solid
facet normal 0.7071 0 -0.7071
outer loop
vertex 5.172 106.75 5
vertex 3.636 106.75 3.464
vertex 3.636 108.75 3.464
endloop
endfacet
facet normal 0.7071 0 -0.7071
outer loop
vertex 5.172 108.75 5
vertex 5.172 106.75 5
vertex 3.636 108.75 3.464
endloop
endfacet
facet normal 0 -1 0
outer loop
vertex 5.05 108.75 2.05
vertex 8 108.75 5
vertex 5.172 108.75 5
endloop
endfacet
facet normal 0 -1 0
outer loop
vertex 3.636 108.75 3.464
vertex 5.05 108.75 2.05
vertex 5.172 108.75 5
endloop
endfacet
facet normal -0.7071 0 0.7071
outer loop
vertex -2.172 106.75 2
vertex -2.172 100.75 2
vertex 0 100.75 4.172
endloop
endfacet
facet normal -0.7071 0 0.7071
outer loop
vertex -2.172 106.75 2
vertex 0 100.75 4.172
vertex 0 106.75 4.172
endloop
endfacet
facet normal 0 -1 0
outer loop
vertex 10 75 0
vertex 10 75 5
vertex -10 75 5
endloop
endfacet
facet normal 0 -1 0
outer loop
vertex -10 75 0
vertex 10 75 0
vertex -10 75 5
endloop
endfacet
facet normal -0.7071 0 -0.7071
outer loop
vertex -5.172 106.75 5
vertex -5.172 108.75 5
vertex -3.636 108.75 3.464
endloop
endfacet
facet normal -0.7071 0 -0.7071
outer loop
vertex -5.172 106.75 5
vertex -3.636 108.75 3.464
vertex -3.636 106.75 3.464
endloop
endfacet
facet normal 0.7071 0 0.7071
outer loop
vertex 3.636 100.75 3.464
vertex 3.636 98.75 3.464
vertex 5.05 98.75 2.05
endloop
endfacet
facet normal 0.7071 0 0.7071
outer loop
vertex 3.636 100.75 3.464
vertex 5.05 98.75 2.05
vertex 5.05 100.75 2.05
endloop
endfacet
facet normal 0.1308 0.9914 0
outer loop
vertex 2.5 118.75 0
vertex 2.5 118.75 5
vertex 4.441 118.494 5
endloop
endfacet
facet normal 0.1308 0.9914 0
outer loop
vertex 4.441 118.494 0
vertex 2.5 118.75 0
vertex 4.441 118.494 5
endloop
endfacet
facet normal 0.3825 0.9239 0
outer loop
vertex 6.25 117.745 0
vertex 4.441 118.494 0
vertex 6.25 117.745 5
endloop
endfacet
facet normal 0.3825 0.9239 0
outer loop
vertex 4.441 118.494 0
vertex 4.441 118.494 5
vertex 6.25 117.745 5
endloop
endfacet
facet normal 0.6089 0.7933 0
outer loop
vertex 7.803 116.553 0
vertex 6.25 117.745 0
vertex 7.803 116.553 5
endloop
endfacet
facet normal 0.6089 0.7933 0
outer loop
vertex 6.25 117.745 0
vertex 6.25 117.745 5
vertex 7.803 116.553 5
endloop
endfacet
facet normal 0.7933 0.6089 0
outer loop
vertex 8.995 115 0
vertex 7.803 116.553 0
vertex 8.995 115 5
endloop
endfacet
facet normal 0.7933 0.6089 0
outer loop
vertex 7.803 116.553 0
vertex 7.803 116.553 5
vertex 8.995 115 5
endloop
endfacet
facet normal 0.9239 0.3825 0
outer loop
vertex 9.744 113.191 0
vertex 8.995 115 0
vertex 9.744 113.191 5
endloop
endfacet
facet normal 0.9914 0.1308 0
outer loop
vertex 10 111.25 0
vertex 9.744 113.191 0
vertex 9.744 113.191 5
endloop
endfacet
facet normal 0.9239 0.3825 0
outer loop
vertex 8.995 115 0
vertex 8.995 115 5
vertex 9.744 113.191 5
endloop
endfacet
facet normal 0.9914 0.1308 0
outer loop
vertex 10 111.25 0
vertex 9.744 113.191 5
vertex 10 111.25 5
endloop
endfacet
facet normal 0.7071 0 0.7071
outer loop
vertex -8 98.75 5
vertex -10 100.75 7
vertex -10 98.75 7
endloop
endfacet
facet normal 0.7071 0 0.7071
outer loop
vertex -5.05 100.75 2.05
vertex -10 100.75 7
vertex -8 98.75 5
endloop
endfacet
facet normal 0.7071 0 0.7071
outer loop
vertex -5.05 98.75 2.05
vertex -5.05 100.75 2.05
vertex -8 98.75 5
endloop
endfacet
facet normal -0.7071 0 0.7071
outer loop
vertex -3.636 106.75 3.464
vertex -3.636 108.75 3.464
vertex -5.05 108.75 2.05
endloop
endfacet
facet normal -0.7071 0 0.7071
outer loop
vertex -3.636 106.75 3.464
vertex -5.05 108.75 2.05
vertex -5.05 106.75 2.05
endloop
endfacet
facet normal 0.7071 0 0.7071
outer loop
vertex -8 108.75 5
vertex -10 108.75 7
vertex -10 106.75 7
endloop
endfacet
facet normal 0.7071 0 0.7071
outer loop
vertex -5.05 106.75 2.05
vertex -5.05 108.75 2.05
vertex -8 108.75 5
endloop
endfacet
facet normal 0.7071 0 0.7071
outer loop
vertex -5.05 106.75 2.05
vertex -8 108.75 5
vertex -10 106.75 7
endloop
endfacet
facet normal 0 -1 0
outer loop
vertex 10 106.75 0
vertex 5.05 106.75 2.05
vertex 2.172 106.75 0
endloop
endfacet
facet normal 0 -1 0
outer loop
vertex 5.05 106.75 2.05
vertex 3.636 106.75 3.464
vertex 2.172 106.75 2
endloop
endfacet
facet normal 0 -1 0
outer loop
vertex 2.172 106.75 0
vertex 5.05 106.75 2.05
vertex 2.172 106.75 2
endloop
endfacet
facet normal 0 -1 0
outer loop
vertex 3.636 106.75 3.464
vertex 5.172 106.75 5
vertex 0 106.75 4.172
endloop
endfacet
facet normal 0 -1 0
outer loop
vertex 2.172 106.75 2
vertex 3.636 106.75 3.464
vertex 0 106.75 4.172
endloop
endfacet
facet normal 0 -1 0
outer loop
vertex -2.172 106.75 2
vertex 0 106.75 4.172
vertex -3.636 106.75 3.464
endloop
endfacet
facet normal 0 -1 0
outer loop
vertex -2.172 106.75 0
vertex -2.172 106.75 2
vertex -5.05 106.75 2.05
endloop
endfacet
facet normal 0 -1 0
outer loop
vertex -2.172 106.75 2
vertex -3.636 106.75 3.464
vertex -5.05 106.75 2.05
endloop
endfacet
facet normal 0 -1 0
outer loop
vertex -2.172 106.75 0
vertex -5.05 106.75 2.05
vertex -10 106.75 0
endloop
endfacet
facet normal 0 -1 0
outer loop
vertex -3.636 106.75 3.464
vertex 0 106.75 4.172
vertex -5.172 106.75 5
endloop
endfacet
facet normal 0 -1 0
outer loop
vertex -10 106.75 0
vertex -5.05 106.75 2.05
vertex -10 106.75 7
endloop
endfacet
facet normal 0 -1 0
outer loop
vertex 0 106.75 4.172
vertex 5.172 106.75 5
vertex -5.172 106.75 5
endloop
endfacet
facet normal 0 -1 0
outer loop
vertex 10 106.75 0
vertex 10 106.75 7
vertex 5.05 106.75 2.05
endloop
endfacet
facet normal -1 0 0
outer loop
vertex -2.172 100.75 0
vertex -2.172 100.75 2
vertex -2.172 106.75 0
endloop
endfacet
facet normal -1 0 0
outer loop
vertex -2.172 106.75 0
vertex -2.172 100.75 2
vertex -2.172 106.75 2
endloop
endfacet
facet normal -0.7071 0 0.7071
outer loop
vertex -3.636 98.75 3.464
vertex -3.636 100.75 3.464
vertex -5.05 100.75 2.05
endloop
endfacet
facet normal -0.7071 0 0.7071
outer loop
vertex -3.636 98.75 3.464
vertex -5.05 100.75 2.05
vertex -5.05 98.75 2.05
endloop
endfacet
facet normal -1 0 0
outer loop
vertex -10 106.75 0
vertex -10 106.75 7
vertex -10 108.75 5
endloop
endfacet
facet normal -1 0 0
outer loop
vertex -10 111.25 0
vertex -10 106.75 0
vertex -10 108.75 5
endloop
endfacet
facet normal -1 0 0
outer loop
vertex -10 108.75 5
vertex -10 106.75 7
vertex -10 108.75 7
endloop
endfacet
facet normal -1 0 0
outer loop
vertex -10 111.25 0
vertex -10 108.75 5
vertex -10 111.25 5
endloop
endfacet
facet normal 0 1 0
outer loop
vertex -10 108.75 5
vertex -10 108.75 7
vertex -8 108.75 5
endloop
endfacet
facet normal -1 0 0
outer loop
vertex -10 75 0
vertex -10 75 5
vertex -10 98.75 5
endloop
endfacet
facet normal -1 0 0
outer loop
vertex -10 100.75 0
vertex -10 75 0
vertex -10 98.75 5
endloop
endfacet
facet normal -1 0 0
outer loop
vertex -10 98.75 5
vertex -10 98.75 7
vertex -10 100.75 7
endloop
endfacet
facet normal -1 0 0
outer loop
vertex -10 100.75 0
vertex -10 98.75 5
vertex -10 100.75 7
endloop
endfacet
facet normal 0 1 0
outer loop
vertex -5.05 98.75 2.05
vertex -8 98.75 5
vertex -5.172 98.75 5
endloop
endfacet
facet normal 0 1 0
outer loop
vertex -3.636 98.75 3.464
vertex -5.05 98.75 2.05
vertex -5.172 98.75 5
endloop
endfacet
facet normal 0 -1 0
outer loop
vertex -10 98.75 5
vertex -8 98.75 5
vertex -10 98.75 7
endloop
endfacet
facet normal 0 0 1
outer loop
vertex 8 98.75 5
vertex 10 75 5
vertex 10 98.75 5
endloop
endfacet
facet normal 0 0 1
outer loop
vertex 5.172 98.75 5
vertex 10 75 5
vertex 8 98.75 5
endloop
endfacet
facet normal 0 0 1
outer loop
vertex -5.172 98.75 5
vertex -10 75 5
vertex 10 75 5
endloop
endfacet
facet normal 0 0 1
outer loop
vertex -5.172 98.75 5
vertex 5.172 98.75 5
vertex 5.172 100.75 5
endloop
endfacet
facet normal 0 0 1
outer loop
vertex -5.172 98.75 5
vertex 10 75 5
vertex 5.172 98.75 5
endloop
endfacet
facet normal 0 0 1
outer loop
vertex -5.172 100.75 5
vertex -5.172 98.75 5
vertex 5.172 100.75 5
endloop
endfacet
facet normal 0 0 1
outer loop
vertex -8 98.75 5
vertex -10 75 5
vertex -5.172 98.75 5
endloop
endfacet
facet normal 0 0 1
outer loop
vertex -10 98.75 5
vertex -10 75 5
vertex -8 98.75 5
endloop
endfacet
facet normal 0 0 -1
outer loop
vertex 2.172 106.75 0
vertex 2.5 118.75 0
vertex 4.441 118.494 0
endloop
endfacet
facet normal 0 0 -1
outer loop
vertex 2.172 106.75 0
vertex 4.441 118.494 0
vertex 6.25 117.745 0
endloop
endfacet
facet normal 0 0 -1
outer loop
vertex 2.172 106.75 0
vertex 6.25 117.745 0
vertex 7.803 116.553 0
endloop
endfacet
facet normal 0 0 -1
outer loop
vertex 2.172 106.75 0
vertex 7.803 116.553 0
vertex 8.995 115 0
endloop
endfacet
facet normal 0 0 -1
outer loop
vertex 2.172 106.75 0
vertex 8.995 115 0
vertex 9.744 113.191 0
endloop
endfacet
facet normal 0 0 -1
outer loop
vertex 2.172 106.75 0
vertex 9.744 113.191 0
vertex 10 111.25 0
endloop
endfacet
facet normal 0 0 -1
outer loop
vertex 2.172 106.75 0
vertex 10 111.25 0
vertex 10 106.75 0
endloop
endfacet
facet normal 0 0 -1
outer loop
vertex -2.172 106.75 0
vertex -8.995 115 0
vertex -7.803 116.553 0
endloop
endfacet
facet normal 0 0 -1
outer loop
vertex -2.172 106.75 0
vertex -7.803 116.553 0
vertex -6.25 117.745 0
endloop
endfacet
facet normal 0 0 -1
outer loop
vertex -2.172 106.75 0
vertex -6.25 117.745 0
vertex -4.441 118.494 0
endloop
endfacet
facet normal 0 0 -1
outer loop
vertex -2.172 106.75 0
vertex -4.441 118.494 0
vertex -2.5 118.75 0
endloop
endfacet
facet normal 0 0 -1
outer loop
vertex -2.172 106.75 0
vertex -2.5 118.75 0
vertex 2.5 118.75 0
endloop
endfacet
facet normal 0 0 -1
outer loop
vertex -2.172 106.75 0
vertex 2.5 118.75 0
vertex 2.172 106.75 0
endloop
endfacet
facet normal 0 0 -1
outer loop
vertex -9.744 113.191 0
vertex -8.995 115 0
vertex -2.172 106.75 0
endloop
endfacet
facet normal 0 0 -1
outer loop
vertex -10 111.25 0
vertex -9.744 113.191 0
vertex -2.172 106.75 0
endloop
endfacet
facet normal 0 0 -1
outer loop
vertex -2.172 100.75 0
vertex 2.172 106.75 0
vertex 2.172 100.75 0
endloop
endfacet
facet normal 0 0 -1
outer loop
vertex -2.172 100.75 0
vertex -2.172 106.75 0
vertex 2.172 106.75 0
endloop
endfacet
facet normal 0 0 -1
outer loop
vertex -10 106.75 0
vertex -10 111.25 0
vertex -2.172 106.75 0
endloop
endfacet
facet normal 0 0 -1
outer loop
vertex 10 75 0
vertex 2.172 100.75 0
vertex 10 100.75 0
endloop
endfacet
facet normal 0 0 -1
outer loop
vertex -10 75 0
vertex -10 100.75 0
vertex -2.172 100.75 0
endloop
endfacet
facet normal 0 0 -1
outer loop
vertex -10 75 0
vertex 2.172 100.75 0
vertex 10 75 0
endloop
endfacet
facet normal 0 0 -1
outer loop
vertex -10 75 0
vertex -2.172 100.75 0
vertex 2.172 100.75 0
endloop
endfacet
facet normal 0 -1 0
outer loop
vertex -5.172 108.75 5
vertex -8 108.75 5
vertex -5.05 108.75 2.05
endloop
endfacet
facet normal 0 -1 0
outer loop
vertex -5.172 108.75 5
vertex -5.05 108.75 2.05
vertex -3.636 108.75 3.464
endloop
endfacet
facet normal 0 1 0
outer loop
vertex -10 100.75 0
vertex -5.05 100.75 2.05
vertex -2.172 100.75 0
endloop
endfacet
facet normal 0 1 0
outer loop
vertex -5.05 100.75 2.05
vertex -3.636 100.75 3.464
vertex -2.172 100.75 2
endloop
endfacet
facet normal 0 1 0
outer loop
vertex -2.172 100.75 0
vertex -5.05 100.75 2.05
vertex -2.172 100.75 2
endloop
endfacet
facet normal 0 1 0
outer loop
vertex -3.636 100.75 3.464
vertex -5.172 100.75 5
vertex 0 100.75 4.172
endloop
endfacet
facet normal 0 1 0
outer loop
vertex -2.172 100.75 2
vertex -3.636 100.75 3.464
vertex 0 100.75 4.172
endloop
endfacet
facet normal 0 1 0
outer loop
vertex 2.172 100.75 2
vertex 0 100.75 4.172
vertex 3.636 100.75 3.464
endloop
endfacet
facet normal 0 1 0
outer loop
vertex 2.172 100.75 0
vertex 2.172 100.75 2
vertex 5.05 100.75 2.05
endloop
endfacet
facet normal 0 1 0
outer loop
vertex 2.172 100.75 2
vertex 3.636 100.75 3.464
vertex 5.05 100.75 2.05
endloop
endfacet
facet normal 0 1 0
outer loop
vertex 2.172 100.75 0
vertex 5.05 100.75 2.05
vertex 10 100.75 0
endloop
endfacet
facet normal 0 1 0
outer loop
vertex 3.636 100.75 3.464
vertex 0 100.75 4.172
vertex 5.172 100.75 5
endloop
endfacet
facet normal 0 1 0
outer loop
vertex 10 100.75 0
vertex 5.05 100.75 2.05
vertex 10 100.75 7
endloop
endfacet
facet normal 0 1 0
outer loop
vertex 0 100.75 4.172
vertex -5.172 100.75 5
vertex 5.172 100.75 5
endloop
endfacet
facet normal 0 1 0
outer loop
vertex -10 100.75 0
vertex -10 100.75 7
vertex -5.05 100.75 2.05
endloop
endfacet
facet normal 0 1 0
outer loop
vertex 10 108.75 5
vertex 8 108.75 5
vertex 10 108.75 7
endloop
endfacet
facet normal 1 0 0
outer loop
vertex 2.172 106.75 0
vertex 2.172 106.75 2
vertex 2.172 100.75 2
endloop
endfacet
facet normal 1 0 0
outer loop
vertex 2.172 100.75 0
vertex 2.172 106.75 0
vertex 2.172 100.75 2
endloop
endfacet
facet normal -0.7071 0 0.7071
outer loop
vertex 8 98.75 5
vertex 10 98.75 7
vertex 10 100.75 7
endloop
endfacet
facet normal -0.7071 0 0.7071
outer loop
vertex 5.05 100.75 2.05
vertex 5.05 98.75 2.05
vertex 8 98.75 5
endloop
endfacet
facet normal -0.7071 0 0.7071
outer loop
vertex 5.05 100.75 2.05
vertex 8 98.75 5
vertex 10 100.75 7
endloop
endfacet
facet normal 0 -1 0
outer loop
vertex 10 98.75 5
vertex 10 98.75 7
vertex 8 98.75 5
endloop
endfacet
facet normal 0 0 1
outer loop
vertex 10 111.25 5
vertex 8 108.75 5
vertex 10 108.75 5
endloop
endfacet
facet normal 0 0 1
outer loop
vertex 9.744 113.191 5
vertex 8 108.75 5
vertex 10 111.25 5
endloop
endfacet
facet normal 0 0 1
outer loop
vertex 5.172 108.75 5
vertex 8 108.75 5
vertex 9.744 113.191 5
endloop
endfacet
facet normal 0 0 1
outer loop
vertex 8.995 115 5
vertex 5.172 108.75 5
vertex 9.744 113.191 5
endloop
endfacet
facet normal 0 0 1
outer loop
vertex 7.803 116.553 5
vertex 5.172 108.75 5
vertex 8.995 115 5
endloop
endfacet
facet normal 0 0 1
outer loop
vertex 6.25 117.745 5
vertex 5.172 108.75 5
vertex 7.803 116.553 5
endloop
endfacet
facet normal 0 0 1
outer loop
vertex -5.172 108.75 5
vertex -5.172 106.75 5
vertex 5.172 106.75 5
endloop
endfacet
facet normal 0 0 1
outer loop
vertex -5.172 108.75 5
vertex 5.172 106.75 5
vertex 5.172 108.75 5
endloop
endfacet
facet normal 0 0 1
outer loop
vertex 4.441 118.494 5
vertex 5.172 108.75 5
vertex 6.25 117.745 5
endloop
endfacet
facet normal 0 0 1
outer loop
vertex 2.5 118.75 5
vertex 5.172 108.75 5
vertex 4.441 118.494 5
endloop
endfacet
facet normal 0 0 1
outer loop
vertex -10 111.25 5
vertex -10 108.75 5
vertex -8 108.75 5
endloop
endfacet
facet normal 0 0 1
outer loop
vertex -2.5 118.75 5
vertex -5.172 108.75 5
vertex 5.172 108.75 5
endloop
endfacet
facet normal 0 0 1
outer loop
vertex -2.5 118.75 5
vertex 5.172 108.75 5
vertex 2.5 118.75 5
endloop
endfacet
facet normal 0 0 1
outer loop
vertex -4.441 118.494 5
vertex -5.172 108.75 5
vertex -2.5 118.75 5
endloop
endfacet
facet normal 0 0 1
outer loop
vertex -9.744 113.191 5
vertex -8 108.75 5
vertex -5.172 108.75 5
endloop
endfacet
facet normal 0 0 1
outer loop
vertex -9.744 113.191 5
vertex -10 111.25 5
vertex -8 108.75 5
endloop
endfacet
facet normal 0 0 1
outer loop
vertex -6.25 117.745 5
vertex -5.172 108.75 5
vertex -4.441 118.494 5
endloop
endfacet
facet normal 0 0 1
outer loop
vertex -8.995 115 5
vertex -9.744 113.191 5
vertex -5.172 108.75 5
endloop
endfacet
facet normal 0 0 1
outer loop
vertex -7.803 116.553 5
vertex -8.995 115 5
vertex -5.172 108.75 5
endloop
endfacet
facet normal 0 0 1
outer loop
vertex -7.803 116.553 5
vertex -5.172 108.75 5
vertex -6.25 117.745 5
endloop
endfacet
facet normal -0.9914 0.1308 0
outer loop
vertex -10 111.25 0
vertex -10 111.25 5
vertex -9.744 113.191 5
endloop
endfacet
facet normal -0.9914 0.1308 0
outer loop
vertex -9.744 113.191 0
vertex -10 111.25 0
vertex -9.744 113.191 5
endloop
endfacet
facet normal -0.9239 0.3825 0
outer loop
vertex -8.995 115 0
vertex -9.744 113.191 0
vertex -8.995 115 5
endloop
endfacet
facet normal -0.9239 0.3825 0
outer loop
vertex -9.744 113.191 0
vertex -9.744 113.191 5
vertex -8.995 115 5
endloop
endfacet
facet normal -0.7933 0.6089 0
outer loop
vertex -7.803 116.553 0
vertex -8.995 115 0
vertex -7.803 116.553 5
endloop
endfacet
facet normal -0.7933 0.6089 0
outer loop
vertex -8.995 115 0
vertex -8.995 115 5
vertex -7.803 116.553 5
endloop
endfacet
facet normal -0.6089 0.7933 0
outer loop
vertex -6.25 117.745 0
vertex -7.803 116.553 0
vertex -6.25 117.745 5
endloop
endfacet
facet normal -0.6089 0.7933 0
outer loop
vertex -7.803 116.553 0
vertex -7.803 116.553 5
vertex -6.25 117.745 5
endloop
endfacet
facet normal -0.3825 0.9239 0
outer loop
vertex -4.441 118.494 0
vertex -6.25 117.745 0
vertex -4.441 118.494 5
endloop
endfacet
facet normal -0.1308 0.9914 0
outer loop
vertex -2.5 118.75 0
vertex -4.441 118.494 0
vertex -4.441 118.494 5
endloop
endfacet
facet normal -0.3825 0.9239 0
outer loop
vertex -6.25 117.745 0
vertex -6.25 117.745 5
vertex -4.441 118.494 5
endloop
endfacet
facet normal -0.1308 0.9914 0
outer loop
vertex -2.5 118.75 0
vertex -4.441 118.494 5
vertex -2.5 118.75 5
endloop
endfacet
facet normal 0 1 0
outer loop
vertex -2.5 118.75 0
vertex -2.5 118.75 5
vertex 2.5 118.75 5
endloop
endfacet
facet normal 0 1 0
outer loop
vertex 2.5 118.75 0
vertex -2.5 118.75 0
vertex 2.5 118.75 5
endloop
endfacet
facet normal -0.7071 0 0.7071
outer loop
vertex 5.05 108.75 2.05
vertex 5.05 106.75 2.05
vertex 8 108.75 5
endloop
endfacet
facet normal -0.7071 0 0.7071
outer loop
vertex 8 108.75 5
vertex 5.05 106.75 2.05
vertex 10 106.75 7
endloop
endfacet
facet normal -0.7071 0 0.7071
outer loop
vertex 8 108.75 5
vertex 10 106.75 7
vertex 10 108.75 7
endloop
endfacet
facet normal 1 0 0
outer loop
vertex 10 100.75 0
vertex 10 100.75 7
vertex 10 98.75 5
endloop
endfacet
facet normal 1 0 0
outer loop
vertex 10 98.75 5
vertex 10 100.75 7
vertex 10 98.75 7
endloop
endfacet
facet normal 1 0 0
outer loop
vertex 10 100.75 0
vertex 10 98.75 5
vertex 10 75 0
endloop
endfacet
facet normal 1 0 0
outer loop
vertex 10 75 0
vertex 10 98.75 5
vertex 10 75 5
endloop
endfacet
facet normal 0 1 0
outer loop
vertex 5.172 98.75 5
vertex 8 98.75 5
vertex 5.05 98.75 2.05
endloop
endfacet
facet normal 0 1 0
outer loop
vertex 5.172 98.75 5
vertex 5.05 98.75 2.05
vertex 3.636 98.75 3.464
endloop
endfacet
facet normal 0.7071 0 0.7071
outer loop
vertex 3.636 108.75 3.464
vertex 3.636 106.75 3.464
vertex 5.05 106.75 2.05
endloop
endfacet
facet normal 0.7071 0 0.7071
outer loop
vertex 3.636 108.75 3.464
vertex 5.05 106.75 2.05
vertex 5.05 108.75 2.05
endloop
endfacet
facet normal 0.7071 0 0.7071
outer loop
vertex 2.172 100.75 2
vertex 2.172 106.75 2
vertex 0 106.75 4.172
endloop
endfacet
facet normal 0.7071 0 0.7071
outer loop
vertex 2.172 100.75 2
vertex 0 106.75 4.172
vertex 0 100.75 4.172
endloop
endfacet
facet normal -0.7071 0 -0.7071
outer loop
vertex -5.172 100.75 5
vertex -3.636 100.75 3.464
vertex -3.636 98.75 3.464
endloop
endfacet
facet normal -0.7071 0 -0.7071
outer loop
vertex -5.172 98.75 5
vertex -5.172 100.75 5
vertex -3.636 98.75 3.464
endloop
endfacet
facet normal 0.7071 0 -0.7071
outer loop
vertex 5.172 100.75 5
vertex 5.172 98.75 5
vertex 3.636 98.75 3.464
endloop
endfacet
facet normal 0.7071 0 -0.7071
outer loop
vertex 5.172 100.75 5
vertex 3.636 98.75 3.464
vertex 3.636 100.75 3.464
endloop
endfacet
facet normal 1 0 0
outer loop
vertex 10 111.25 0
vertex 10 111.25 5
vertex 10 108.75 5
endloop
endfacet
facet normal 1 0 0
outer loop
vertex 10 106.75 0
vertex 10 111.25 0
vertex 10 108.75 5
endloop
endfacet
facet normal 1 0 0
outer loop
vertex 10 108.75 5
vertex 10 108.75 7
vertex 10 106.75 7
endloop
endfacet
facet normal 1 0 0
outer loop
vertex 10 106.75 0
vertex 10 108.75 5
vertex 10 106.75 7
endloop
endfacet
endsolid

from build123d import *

# Parameters (mm, degrees)
PAD330_DEPTH         = 5
POCKET338_DEPTH      = 3
POCKET338_DEPTH_BACK = 3
SKETCH686_W          = 10
SKETCH686_H          = 2
POCKET342_DEPTH      = 5
POCKET342_DEPTH_BACK = 2
SKETCH674_W          = 10
SKETCH674_H          = 2
POCKET337_DEPTH      = 5
POCKET337_DEPTH_BACK = 2
POCKET337_FACE20_W   = 6
POCKET337_FACE20_H   = 5
POCKET344_DEPTH      = 5
POCKET344_FACE26_W   = 6
POCKET344_FACE26_H   = 5
POCKET349_DEPTH      = 5
PAD331_DEPTH         = 2
POCKET343_DEPTH      = 2
POCKET343_FACE66_W   = 6
POCKET343_FACE66_H   = 2.071068
POCKET352_DEPTH      = 5
POCKET352_FACE38_W   = 6
POCKET352_FACE38_H   = 2.071068
POCKET345_DEPTH      = 5


with BuildPart() as part:
    # Sketch675 → Pad330 (new body)
    with BuildSketch(Plane.XY):
        with BuildLine():
            Line((-10, -28.75), (10, -28.75))
            Line((10, -28.75), (10, 7.5))
            ThreePointArc((10, 7.5), (7.803301, 12.803301), (2.5, 15))
            Line((2.5, 15), (-2.5, 15))
            ThreePointArc((-2.5, 15), (-7.803301, 12.803301), (-10, 7.5))
            Line((-10, 7.5), (-10, -28.75))
        make_face()
    extrude(amount=PAD330_DEPTH)

    # Sketch666 → Pocket338 (cut, two sides)
    with BuildSketch(Plane.XZ) as pocket338_sk:
        Polygon((-10, 0), (-10, 5), (-8.585786, 6.414214), (-2.171573, 0), (-5, 0), align=None)
        Polygon((10, 0), (10, 5), (8.585786, 6.414214), (2.171573, 0), (5, 0), align=None)
    extrude(amount=-POCKET338_DEPTH, mode=Mode.SUBTRACT)
    extrude(pocket338_sk.sketch, amount=POCKET338_DEPTH_BACK, mode=Mode.SUBTRACT)

    # Sketch686 (on DatumPlane) → Pocket342 (cut, two sides)
    with BuildSketch(Plane(origin=(-7.171573, 3, 5), x_dir=(0, -1, 0), z_dir=(-0.707107, 0, 0.707107))) as pocket342_sk:
        with Locations((3, -1)):
            Rectangle(SKETCH686_W, SKETCH686_H)
    extrude(amount=-POCKET342_DEPTH, mode=Mode.SUBTRACT)
    extrude(pocket342_sk.sketch, amount=POCKET342_DEPTH_BACK, mode=Mode.SUBTRACT)

    # Sketch674 (on DatumPlane) → Pocket337 (cut, two sides)
    with BuildSketch(Plane(origin=(7.171573, 3, 5), x_dir=(0, 1, 0), z_dir=(0.707107, 0, 0.707107))) as pocket337_sk:
        with Locations((-3, -1)):
            Rectangle(SKETCH674_W, SKETCH674_H)
    extrude(amount=-POCKET337_DEPTH, mode=Mode.SUBTRACT)
    extrude(pocket337_sk.sketch, amount=POCKET337_DEPTH_BACK, mode=Mode.SUBTRACT)

    # Pocket337 Face20 → Pocket344 (cut)
    with BuildSketch(Plane(origin=(-5.403806, 0, 3.232233), x_dir=(0, 1, 0), z_dir=(-0.707107, 0, -0.707107))):
        Rectangle(POCKET337_FACE20_W, POCKET337_FACE20_H)
    extrude(amount=-POCKET344_DEPTH, mode=Mode.SUBTRACT)

    # Pocket344 Face26 → Pocket349 (cut)
    with BuildSketch(Plane(origin=(5.403806, 0, 3.232233), x_dir=(0, -1, 0), z_dir=(0.707107, 0, -0.707107))):
        Rectangle(POCKET344_FACE26_W, POCKET344_FACE26_H)
    extrude(amount=-POCKET349_DEPTH, mode=Mode.SUBTRACT)

    # Pocket349 Face4 → Pad331 (add)
    with BuildSketch(Plane(origin=(0, -8.372552, 0), x_dir=(0, -1, 0), z_dir=(0, 0, -1))):
        with BuildLine():
            Line((20.377448, 10), (-5.372552, 10))
            Line((-5.372552, 10), (-5.372552, 5))
            Line((-5.372552, 5), (-5.372552, 2.171573))
            Line((-5.372552, 2.171573), (-11.372552, 2.171573))
            Line((-11.372552, 2.171573), (-11.372552, 5))
            Line((-11.372552, 5), (-11.372552, 10))
            Line((-11.372552, 10), (-15.872552, 10))
            ThreePointArc((-15.872552, 10), (-21.175853, 7.803301), (-23.372552, 2.5))
            Line((-23.372552, 2.5), (-23.372552, -2.5))
            ThreePointArc((-23.372552, -2.5), (-21.175853, -7.803301), (-15.872552, -10))
            Line((-15.872552, -10), (-11.372552, -10))
            Line((-11.372552, -10), (-11.372552, -5))
            Line((-11.372552, -5), (-11.372552, -2.171573))
            Line((-11.372552, -2.171573), (-5.372552, -2.171573))
            Line((-5.372552, -2.171573), (-5.372552, -5))
            Line((-5.372552, -5), (-5.372552, -10))
            Line((-5.372552, -10), (20.377448, -10))
            Line((20.377448, -10), (20.377448, 10))
        make_face()
    extrude(amount=PAD331_DEPTH)

    # Pad331 Face5 → Pocket343 (cut)
    with BuildSketch(Plane(origin=(0, -8.9329, 5), x_dir=(0, 1, 0), z_dir=(0, 0, 1))):
        with BuildLine():
            Line((11.9329, 0.100505), (5.9329, 0.100505))
            Line((5.9329, 0.100505), (5.9329, 7.171573))
            Line((5.9329, 7.171573), (3.9329, 7.171573))
            Line((3.9329, 7.171573), (3.9329, 10))
            Line((3.9329, 10), (-19.8171, 10))
            Line((-19.8171, 10), (-19.8171, -10))
            Line((-19.8171, -10), (3.9329, -10))
            Line((3.9329, -10), (3.9329, -7.171573))
            Line((3.9329, -7.171573), (5.9329, -7.171573))
            Line((5.9329, -7.171573), (5.9329, -0.100505))
            Line((5.9329, -0.100505), (11.9329, -0.100505))
            Line((11.9329, -0.100505), (11.9329, -7.171573))
            Line((11.9329, -7.171573), (13.9329, -7.171573))
            Line((13.9329, -7.171573), (13.9329, -10))
            Line((13.9329, -10), (16.4329, -10))
            ThreePointArc((16.4329, -10), (21.736201, -7.803301), (23.9329, -2.5))
            Line((23.9329, -2.5), (23.9329, 2.5))
            ThreePointArc((23.9329, 2.5), (21.736201, 7.803301), (16.4329, 10))
            Line((16.4329, 10), (13.9329, 10))
            Line((13.9329, 10), (13.9329, 7.171573))
            Line((13.9329, 7.171573), (11.9329, 7.171573))
            Line((11.9329, 7.171573), (11.9329, 0.100505))
        make_face()
    extrude(amount=-POCKET343_DEPTH, mode=Mode.SUBTRACT)

    # Pocket343 Face66 → Pocket352 (cut)
    with BuildSketch(Plane(origin=(-2.903806, 0, 0.732233), x_dir=(0, 1, 0), z_dir=(-0.707107, 0, -0.707107))):
        Rectangle(POCKET343_FACE66_W, POCKET343_FACE66_H)
    extrude(amount=-POCKET352_DEPTH, mode=Mode.SUBTRACT)

    # Pocket352 Face38 → Pocket345 (cut)
    with BuildSketch(Plane(origin=(2.903806, 0, 0.732233), x_dir=(0, -1, 0), z_dir=(0.707107, 0, -0.707107))):
        Rectangle(POCKET352_FACE38_W, POCKET352_FACE38_H)
    extrude(amount=-POCKET345_DEPTH, mode=Mode.SUBTRACT)


with BuildPart() as part_1:
    # Body211 placement: moved
    add(part.part.moved(Location((0, 103.75, 2))))


solid = part_1.part
